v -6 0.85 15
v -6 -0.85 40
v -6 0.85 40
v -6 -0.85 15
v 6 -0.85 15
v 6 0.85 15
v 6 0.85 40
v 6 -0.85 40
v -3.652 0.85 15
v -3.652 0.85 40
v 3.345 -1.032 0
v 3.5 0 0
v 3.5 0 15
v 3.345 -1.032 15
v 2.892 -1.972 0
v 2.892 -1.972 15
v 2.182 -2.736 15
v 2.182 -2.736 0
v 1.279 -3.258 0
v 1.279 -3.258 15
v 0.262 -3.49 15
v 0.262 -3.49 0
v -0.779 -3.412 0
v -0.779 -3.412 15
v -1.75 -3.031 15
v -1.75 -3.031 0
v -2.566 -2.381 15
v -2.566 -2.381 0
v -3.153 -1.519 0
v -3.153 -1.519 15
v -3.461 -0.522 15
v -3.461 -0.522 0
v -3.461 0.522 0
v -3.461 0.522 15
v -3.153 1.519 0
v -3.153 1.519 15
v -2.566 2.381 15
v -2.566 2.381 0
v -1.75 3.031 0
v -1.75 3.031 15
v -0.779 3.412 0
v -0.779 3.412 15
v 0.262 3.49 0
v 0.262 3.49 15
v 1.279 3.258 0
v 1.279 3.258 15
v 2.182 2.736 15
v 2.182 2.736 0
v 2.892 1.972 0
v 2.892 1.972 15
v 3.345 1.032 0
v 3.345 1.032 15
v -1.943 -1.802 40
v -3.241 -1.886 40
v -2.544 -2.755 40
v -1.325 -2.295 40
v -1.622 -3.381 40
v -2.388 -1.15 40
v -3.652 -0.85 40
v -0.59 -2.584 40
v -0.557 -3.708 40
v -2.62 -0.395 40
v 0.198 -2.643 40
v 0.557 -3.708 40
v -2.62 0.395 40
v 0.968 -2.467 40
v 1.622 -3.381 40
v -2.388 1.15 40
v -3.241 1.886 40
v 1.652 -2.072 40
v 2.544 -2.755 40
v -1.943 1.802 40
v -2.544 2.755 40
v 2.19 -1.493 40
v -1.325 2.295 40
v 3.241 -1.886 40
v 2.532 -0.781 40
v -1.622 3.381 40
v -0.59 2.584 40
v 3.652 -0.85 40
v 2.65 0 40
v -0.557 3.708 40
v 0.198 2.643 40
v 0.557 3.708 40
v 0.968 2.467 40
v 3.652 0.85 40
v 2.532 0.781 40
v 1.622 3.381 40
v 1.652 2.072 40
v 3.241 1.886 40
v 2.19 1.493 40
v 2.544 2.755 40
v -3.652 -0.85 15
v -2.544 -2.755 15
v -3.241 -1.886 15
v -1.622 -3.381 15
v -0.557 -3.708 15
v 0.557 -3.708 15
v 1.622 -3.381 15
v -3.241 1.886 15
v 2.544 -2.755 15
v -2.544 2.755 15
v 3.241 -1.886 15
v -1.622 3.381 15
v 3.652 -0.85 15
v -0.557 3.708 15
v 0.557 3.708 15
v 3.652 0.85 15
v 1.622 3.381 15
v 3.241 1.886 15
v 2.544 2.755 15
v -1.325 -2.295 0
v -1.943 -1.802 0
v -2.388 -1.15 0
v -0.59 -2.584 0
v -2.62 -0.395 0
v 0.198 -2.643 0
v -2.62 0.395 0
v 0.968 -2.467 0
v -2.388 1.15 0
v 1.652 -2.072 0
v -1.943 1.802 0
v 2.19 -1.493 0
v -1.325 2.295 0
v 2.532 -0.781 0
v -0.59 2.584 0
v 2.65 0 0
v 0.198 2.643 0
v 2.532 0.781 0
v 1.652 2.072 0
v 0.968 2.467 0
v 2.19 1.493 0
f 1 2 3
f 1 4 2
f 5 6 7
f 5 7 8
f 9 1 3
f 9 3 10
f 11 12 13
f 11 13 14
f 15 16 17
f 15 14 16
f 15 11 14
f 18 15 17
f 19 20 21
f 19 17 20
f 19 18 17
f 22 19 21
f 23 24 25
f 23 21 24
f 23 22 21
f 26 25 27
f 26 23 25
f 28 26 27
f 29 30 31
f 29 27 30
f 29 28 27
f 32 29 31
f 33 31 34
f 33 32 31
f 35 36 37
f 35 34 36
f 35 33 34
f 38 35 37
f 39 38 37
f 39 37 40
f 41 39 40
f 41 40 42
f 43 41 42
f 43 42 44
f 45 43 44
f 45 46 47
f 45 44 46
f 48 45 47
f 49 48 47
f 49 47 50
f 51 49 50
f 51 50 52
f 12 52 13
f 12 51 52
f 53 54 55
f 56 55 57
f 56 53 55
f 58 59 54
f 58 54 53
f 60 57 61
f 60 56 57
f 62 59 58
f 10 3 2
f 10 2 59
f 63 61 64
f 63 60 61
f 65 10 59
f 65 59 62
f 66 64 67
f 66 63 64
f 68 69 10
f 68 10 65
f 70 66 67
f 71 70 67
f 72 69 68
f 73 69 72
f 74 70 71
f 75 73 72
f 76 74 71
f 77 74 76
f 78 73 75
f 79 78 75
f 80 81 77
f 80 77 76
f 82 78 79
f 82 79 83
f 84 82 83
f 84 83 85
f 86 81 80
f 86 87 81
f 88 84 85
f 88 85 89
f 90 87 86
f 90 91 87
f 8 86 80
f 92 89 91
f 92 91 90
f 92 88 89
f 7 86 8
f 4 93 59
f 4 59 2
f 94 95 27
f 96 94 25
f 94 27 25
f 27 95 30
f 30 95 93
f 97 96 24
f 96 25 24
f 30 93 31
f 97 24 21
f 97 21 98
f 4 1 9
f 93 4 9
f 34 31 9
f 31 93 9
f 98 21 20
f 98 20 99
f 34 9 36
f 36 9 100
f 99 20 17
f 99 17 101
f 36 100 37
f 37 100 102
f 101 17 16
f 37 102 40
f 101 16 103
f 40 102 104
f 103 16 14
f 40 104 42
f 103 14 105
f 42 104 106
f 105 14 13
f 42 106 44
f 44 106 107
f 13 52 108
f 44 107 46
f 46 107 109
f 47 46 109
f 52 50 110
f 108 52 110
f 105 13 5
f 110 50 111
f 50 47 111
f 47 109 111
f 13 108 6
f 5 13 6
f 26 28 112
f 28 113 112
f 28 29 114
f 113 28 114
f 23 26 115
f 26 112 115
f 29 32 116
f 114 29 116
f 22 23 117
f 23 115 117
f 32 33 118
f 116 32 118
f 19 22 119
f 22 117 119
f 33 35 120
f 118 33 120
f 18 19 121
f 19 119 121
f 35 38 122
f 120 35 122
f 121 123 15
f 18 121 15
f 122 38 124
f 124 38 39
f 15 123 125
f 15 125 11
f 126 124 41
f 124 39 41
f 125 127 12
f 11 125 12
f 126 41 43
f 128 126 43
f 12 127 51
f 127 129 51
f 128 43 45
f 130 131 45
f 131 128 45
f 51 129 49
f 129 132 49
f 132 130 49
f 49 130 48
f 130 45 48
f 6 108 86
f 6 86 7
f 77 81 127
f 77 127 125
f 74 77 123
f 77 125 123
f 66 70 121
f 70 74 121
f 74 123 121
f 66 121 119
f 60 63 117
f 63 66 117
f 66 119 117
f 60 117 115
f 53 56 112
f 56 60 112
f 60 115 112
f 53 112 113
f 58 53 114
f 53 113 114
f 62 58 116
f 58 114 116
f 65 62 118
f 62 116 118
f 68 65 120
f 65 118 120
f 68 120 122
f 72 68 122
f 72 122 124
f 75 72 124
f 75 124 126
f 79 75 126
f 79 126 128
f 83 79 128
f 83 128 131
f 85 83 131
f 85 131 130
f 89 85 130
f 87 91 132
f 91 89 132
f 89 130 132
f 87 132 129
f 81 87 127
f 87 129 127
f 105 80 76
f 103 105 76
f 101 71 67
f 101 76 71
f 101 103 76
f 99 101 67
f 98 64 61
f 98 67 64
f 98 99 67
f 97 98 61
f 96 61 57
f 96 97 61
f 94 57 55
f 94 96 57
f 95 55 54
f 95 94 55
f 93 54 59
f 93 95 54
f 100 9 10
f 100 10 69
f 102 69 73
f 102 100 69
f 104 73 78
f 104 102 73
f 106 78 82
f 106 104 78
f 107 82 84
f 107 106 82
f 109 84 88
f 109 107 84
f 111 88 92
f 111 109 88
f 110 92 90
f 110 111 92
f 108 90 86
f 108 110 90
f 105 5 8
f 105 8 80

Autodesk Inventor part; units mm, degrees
ref_plane "YZ Plane" through (0, 0, 0) normal (1, 0, 0) x (0, 1, 0)
ref_plane "XZ Plane" through (0, 0, 0) normal (0, 1, 0) x (-1, 0, 0)
ref_plane "XY Plane" through (0, 0, 0) normal (0, 0, 1) x (1, 0, 0)
sketch "Sketch1" plane through (0, 0, 0) normal (0, 0, 1) x (1, 0, 0)
  circle A0 centre (0, 0) radius 2.65
  circle A1 centre (0, 0) radius 3.5
  dimension "d0" = 5.3
  dimension "d1" = 7
extrude "Extrusion1" add sketch "Sketch1" along normal blind 15
sketch "Sketch2" plane through (0, 0, 15) normal (0, 0, 1) x (1, 0, 0)
  circle A0 centre (0, 0) radius 2.65 projected
  circle A1 centre (0, 0) radius 3.75
  line L0 (-6, 0.85) -> (6, 0.85)
  line L1 (6, 0.85) -> (6, -0.85)
  line L2 (6, -0.85) -> (-6, -0.85)
  line L3 (-6, -0.85) -> (-6, 0.85)
  line L4 (-6, 0.85) -> (6, -0.85) construction
  line L5 (6, 0.85) -> (-6, -0.85) construction
  point P0 (-3.6524, 0.85)
  point P1 (-3.6524, -0.85)
  point P2 (3.6524, -0.85)
  point P3 (3.6524, 0.85)
  dimension "d4" = 7.5
  dimension "d5" = 12
  dimension "d6" = 1.7
extrude "Extrusion2" add sketch "Sketch2" along normal blind 25 contours A0 L0 A1 L2 | A0 L0 A1 | L2 A1 A0 | A0 L2 A1 L0 | L0 L1 L2 A1 | A1 L2 L3 L0
properties part number "final pin_3DPrint"
